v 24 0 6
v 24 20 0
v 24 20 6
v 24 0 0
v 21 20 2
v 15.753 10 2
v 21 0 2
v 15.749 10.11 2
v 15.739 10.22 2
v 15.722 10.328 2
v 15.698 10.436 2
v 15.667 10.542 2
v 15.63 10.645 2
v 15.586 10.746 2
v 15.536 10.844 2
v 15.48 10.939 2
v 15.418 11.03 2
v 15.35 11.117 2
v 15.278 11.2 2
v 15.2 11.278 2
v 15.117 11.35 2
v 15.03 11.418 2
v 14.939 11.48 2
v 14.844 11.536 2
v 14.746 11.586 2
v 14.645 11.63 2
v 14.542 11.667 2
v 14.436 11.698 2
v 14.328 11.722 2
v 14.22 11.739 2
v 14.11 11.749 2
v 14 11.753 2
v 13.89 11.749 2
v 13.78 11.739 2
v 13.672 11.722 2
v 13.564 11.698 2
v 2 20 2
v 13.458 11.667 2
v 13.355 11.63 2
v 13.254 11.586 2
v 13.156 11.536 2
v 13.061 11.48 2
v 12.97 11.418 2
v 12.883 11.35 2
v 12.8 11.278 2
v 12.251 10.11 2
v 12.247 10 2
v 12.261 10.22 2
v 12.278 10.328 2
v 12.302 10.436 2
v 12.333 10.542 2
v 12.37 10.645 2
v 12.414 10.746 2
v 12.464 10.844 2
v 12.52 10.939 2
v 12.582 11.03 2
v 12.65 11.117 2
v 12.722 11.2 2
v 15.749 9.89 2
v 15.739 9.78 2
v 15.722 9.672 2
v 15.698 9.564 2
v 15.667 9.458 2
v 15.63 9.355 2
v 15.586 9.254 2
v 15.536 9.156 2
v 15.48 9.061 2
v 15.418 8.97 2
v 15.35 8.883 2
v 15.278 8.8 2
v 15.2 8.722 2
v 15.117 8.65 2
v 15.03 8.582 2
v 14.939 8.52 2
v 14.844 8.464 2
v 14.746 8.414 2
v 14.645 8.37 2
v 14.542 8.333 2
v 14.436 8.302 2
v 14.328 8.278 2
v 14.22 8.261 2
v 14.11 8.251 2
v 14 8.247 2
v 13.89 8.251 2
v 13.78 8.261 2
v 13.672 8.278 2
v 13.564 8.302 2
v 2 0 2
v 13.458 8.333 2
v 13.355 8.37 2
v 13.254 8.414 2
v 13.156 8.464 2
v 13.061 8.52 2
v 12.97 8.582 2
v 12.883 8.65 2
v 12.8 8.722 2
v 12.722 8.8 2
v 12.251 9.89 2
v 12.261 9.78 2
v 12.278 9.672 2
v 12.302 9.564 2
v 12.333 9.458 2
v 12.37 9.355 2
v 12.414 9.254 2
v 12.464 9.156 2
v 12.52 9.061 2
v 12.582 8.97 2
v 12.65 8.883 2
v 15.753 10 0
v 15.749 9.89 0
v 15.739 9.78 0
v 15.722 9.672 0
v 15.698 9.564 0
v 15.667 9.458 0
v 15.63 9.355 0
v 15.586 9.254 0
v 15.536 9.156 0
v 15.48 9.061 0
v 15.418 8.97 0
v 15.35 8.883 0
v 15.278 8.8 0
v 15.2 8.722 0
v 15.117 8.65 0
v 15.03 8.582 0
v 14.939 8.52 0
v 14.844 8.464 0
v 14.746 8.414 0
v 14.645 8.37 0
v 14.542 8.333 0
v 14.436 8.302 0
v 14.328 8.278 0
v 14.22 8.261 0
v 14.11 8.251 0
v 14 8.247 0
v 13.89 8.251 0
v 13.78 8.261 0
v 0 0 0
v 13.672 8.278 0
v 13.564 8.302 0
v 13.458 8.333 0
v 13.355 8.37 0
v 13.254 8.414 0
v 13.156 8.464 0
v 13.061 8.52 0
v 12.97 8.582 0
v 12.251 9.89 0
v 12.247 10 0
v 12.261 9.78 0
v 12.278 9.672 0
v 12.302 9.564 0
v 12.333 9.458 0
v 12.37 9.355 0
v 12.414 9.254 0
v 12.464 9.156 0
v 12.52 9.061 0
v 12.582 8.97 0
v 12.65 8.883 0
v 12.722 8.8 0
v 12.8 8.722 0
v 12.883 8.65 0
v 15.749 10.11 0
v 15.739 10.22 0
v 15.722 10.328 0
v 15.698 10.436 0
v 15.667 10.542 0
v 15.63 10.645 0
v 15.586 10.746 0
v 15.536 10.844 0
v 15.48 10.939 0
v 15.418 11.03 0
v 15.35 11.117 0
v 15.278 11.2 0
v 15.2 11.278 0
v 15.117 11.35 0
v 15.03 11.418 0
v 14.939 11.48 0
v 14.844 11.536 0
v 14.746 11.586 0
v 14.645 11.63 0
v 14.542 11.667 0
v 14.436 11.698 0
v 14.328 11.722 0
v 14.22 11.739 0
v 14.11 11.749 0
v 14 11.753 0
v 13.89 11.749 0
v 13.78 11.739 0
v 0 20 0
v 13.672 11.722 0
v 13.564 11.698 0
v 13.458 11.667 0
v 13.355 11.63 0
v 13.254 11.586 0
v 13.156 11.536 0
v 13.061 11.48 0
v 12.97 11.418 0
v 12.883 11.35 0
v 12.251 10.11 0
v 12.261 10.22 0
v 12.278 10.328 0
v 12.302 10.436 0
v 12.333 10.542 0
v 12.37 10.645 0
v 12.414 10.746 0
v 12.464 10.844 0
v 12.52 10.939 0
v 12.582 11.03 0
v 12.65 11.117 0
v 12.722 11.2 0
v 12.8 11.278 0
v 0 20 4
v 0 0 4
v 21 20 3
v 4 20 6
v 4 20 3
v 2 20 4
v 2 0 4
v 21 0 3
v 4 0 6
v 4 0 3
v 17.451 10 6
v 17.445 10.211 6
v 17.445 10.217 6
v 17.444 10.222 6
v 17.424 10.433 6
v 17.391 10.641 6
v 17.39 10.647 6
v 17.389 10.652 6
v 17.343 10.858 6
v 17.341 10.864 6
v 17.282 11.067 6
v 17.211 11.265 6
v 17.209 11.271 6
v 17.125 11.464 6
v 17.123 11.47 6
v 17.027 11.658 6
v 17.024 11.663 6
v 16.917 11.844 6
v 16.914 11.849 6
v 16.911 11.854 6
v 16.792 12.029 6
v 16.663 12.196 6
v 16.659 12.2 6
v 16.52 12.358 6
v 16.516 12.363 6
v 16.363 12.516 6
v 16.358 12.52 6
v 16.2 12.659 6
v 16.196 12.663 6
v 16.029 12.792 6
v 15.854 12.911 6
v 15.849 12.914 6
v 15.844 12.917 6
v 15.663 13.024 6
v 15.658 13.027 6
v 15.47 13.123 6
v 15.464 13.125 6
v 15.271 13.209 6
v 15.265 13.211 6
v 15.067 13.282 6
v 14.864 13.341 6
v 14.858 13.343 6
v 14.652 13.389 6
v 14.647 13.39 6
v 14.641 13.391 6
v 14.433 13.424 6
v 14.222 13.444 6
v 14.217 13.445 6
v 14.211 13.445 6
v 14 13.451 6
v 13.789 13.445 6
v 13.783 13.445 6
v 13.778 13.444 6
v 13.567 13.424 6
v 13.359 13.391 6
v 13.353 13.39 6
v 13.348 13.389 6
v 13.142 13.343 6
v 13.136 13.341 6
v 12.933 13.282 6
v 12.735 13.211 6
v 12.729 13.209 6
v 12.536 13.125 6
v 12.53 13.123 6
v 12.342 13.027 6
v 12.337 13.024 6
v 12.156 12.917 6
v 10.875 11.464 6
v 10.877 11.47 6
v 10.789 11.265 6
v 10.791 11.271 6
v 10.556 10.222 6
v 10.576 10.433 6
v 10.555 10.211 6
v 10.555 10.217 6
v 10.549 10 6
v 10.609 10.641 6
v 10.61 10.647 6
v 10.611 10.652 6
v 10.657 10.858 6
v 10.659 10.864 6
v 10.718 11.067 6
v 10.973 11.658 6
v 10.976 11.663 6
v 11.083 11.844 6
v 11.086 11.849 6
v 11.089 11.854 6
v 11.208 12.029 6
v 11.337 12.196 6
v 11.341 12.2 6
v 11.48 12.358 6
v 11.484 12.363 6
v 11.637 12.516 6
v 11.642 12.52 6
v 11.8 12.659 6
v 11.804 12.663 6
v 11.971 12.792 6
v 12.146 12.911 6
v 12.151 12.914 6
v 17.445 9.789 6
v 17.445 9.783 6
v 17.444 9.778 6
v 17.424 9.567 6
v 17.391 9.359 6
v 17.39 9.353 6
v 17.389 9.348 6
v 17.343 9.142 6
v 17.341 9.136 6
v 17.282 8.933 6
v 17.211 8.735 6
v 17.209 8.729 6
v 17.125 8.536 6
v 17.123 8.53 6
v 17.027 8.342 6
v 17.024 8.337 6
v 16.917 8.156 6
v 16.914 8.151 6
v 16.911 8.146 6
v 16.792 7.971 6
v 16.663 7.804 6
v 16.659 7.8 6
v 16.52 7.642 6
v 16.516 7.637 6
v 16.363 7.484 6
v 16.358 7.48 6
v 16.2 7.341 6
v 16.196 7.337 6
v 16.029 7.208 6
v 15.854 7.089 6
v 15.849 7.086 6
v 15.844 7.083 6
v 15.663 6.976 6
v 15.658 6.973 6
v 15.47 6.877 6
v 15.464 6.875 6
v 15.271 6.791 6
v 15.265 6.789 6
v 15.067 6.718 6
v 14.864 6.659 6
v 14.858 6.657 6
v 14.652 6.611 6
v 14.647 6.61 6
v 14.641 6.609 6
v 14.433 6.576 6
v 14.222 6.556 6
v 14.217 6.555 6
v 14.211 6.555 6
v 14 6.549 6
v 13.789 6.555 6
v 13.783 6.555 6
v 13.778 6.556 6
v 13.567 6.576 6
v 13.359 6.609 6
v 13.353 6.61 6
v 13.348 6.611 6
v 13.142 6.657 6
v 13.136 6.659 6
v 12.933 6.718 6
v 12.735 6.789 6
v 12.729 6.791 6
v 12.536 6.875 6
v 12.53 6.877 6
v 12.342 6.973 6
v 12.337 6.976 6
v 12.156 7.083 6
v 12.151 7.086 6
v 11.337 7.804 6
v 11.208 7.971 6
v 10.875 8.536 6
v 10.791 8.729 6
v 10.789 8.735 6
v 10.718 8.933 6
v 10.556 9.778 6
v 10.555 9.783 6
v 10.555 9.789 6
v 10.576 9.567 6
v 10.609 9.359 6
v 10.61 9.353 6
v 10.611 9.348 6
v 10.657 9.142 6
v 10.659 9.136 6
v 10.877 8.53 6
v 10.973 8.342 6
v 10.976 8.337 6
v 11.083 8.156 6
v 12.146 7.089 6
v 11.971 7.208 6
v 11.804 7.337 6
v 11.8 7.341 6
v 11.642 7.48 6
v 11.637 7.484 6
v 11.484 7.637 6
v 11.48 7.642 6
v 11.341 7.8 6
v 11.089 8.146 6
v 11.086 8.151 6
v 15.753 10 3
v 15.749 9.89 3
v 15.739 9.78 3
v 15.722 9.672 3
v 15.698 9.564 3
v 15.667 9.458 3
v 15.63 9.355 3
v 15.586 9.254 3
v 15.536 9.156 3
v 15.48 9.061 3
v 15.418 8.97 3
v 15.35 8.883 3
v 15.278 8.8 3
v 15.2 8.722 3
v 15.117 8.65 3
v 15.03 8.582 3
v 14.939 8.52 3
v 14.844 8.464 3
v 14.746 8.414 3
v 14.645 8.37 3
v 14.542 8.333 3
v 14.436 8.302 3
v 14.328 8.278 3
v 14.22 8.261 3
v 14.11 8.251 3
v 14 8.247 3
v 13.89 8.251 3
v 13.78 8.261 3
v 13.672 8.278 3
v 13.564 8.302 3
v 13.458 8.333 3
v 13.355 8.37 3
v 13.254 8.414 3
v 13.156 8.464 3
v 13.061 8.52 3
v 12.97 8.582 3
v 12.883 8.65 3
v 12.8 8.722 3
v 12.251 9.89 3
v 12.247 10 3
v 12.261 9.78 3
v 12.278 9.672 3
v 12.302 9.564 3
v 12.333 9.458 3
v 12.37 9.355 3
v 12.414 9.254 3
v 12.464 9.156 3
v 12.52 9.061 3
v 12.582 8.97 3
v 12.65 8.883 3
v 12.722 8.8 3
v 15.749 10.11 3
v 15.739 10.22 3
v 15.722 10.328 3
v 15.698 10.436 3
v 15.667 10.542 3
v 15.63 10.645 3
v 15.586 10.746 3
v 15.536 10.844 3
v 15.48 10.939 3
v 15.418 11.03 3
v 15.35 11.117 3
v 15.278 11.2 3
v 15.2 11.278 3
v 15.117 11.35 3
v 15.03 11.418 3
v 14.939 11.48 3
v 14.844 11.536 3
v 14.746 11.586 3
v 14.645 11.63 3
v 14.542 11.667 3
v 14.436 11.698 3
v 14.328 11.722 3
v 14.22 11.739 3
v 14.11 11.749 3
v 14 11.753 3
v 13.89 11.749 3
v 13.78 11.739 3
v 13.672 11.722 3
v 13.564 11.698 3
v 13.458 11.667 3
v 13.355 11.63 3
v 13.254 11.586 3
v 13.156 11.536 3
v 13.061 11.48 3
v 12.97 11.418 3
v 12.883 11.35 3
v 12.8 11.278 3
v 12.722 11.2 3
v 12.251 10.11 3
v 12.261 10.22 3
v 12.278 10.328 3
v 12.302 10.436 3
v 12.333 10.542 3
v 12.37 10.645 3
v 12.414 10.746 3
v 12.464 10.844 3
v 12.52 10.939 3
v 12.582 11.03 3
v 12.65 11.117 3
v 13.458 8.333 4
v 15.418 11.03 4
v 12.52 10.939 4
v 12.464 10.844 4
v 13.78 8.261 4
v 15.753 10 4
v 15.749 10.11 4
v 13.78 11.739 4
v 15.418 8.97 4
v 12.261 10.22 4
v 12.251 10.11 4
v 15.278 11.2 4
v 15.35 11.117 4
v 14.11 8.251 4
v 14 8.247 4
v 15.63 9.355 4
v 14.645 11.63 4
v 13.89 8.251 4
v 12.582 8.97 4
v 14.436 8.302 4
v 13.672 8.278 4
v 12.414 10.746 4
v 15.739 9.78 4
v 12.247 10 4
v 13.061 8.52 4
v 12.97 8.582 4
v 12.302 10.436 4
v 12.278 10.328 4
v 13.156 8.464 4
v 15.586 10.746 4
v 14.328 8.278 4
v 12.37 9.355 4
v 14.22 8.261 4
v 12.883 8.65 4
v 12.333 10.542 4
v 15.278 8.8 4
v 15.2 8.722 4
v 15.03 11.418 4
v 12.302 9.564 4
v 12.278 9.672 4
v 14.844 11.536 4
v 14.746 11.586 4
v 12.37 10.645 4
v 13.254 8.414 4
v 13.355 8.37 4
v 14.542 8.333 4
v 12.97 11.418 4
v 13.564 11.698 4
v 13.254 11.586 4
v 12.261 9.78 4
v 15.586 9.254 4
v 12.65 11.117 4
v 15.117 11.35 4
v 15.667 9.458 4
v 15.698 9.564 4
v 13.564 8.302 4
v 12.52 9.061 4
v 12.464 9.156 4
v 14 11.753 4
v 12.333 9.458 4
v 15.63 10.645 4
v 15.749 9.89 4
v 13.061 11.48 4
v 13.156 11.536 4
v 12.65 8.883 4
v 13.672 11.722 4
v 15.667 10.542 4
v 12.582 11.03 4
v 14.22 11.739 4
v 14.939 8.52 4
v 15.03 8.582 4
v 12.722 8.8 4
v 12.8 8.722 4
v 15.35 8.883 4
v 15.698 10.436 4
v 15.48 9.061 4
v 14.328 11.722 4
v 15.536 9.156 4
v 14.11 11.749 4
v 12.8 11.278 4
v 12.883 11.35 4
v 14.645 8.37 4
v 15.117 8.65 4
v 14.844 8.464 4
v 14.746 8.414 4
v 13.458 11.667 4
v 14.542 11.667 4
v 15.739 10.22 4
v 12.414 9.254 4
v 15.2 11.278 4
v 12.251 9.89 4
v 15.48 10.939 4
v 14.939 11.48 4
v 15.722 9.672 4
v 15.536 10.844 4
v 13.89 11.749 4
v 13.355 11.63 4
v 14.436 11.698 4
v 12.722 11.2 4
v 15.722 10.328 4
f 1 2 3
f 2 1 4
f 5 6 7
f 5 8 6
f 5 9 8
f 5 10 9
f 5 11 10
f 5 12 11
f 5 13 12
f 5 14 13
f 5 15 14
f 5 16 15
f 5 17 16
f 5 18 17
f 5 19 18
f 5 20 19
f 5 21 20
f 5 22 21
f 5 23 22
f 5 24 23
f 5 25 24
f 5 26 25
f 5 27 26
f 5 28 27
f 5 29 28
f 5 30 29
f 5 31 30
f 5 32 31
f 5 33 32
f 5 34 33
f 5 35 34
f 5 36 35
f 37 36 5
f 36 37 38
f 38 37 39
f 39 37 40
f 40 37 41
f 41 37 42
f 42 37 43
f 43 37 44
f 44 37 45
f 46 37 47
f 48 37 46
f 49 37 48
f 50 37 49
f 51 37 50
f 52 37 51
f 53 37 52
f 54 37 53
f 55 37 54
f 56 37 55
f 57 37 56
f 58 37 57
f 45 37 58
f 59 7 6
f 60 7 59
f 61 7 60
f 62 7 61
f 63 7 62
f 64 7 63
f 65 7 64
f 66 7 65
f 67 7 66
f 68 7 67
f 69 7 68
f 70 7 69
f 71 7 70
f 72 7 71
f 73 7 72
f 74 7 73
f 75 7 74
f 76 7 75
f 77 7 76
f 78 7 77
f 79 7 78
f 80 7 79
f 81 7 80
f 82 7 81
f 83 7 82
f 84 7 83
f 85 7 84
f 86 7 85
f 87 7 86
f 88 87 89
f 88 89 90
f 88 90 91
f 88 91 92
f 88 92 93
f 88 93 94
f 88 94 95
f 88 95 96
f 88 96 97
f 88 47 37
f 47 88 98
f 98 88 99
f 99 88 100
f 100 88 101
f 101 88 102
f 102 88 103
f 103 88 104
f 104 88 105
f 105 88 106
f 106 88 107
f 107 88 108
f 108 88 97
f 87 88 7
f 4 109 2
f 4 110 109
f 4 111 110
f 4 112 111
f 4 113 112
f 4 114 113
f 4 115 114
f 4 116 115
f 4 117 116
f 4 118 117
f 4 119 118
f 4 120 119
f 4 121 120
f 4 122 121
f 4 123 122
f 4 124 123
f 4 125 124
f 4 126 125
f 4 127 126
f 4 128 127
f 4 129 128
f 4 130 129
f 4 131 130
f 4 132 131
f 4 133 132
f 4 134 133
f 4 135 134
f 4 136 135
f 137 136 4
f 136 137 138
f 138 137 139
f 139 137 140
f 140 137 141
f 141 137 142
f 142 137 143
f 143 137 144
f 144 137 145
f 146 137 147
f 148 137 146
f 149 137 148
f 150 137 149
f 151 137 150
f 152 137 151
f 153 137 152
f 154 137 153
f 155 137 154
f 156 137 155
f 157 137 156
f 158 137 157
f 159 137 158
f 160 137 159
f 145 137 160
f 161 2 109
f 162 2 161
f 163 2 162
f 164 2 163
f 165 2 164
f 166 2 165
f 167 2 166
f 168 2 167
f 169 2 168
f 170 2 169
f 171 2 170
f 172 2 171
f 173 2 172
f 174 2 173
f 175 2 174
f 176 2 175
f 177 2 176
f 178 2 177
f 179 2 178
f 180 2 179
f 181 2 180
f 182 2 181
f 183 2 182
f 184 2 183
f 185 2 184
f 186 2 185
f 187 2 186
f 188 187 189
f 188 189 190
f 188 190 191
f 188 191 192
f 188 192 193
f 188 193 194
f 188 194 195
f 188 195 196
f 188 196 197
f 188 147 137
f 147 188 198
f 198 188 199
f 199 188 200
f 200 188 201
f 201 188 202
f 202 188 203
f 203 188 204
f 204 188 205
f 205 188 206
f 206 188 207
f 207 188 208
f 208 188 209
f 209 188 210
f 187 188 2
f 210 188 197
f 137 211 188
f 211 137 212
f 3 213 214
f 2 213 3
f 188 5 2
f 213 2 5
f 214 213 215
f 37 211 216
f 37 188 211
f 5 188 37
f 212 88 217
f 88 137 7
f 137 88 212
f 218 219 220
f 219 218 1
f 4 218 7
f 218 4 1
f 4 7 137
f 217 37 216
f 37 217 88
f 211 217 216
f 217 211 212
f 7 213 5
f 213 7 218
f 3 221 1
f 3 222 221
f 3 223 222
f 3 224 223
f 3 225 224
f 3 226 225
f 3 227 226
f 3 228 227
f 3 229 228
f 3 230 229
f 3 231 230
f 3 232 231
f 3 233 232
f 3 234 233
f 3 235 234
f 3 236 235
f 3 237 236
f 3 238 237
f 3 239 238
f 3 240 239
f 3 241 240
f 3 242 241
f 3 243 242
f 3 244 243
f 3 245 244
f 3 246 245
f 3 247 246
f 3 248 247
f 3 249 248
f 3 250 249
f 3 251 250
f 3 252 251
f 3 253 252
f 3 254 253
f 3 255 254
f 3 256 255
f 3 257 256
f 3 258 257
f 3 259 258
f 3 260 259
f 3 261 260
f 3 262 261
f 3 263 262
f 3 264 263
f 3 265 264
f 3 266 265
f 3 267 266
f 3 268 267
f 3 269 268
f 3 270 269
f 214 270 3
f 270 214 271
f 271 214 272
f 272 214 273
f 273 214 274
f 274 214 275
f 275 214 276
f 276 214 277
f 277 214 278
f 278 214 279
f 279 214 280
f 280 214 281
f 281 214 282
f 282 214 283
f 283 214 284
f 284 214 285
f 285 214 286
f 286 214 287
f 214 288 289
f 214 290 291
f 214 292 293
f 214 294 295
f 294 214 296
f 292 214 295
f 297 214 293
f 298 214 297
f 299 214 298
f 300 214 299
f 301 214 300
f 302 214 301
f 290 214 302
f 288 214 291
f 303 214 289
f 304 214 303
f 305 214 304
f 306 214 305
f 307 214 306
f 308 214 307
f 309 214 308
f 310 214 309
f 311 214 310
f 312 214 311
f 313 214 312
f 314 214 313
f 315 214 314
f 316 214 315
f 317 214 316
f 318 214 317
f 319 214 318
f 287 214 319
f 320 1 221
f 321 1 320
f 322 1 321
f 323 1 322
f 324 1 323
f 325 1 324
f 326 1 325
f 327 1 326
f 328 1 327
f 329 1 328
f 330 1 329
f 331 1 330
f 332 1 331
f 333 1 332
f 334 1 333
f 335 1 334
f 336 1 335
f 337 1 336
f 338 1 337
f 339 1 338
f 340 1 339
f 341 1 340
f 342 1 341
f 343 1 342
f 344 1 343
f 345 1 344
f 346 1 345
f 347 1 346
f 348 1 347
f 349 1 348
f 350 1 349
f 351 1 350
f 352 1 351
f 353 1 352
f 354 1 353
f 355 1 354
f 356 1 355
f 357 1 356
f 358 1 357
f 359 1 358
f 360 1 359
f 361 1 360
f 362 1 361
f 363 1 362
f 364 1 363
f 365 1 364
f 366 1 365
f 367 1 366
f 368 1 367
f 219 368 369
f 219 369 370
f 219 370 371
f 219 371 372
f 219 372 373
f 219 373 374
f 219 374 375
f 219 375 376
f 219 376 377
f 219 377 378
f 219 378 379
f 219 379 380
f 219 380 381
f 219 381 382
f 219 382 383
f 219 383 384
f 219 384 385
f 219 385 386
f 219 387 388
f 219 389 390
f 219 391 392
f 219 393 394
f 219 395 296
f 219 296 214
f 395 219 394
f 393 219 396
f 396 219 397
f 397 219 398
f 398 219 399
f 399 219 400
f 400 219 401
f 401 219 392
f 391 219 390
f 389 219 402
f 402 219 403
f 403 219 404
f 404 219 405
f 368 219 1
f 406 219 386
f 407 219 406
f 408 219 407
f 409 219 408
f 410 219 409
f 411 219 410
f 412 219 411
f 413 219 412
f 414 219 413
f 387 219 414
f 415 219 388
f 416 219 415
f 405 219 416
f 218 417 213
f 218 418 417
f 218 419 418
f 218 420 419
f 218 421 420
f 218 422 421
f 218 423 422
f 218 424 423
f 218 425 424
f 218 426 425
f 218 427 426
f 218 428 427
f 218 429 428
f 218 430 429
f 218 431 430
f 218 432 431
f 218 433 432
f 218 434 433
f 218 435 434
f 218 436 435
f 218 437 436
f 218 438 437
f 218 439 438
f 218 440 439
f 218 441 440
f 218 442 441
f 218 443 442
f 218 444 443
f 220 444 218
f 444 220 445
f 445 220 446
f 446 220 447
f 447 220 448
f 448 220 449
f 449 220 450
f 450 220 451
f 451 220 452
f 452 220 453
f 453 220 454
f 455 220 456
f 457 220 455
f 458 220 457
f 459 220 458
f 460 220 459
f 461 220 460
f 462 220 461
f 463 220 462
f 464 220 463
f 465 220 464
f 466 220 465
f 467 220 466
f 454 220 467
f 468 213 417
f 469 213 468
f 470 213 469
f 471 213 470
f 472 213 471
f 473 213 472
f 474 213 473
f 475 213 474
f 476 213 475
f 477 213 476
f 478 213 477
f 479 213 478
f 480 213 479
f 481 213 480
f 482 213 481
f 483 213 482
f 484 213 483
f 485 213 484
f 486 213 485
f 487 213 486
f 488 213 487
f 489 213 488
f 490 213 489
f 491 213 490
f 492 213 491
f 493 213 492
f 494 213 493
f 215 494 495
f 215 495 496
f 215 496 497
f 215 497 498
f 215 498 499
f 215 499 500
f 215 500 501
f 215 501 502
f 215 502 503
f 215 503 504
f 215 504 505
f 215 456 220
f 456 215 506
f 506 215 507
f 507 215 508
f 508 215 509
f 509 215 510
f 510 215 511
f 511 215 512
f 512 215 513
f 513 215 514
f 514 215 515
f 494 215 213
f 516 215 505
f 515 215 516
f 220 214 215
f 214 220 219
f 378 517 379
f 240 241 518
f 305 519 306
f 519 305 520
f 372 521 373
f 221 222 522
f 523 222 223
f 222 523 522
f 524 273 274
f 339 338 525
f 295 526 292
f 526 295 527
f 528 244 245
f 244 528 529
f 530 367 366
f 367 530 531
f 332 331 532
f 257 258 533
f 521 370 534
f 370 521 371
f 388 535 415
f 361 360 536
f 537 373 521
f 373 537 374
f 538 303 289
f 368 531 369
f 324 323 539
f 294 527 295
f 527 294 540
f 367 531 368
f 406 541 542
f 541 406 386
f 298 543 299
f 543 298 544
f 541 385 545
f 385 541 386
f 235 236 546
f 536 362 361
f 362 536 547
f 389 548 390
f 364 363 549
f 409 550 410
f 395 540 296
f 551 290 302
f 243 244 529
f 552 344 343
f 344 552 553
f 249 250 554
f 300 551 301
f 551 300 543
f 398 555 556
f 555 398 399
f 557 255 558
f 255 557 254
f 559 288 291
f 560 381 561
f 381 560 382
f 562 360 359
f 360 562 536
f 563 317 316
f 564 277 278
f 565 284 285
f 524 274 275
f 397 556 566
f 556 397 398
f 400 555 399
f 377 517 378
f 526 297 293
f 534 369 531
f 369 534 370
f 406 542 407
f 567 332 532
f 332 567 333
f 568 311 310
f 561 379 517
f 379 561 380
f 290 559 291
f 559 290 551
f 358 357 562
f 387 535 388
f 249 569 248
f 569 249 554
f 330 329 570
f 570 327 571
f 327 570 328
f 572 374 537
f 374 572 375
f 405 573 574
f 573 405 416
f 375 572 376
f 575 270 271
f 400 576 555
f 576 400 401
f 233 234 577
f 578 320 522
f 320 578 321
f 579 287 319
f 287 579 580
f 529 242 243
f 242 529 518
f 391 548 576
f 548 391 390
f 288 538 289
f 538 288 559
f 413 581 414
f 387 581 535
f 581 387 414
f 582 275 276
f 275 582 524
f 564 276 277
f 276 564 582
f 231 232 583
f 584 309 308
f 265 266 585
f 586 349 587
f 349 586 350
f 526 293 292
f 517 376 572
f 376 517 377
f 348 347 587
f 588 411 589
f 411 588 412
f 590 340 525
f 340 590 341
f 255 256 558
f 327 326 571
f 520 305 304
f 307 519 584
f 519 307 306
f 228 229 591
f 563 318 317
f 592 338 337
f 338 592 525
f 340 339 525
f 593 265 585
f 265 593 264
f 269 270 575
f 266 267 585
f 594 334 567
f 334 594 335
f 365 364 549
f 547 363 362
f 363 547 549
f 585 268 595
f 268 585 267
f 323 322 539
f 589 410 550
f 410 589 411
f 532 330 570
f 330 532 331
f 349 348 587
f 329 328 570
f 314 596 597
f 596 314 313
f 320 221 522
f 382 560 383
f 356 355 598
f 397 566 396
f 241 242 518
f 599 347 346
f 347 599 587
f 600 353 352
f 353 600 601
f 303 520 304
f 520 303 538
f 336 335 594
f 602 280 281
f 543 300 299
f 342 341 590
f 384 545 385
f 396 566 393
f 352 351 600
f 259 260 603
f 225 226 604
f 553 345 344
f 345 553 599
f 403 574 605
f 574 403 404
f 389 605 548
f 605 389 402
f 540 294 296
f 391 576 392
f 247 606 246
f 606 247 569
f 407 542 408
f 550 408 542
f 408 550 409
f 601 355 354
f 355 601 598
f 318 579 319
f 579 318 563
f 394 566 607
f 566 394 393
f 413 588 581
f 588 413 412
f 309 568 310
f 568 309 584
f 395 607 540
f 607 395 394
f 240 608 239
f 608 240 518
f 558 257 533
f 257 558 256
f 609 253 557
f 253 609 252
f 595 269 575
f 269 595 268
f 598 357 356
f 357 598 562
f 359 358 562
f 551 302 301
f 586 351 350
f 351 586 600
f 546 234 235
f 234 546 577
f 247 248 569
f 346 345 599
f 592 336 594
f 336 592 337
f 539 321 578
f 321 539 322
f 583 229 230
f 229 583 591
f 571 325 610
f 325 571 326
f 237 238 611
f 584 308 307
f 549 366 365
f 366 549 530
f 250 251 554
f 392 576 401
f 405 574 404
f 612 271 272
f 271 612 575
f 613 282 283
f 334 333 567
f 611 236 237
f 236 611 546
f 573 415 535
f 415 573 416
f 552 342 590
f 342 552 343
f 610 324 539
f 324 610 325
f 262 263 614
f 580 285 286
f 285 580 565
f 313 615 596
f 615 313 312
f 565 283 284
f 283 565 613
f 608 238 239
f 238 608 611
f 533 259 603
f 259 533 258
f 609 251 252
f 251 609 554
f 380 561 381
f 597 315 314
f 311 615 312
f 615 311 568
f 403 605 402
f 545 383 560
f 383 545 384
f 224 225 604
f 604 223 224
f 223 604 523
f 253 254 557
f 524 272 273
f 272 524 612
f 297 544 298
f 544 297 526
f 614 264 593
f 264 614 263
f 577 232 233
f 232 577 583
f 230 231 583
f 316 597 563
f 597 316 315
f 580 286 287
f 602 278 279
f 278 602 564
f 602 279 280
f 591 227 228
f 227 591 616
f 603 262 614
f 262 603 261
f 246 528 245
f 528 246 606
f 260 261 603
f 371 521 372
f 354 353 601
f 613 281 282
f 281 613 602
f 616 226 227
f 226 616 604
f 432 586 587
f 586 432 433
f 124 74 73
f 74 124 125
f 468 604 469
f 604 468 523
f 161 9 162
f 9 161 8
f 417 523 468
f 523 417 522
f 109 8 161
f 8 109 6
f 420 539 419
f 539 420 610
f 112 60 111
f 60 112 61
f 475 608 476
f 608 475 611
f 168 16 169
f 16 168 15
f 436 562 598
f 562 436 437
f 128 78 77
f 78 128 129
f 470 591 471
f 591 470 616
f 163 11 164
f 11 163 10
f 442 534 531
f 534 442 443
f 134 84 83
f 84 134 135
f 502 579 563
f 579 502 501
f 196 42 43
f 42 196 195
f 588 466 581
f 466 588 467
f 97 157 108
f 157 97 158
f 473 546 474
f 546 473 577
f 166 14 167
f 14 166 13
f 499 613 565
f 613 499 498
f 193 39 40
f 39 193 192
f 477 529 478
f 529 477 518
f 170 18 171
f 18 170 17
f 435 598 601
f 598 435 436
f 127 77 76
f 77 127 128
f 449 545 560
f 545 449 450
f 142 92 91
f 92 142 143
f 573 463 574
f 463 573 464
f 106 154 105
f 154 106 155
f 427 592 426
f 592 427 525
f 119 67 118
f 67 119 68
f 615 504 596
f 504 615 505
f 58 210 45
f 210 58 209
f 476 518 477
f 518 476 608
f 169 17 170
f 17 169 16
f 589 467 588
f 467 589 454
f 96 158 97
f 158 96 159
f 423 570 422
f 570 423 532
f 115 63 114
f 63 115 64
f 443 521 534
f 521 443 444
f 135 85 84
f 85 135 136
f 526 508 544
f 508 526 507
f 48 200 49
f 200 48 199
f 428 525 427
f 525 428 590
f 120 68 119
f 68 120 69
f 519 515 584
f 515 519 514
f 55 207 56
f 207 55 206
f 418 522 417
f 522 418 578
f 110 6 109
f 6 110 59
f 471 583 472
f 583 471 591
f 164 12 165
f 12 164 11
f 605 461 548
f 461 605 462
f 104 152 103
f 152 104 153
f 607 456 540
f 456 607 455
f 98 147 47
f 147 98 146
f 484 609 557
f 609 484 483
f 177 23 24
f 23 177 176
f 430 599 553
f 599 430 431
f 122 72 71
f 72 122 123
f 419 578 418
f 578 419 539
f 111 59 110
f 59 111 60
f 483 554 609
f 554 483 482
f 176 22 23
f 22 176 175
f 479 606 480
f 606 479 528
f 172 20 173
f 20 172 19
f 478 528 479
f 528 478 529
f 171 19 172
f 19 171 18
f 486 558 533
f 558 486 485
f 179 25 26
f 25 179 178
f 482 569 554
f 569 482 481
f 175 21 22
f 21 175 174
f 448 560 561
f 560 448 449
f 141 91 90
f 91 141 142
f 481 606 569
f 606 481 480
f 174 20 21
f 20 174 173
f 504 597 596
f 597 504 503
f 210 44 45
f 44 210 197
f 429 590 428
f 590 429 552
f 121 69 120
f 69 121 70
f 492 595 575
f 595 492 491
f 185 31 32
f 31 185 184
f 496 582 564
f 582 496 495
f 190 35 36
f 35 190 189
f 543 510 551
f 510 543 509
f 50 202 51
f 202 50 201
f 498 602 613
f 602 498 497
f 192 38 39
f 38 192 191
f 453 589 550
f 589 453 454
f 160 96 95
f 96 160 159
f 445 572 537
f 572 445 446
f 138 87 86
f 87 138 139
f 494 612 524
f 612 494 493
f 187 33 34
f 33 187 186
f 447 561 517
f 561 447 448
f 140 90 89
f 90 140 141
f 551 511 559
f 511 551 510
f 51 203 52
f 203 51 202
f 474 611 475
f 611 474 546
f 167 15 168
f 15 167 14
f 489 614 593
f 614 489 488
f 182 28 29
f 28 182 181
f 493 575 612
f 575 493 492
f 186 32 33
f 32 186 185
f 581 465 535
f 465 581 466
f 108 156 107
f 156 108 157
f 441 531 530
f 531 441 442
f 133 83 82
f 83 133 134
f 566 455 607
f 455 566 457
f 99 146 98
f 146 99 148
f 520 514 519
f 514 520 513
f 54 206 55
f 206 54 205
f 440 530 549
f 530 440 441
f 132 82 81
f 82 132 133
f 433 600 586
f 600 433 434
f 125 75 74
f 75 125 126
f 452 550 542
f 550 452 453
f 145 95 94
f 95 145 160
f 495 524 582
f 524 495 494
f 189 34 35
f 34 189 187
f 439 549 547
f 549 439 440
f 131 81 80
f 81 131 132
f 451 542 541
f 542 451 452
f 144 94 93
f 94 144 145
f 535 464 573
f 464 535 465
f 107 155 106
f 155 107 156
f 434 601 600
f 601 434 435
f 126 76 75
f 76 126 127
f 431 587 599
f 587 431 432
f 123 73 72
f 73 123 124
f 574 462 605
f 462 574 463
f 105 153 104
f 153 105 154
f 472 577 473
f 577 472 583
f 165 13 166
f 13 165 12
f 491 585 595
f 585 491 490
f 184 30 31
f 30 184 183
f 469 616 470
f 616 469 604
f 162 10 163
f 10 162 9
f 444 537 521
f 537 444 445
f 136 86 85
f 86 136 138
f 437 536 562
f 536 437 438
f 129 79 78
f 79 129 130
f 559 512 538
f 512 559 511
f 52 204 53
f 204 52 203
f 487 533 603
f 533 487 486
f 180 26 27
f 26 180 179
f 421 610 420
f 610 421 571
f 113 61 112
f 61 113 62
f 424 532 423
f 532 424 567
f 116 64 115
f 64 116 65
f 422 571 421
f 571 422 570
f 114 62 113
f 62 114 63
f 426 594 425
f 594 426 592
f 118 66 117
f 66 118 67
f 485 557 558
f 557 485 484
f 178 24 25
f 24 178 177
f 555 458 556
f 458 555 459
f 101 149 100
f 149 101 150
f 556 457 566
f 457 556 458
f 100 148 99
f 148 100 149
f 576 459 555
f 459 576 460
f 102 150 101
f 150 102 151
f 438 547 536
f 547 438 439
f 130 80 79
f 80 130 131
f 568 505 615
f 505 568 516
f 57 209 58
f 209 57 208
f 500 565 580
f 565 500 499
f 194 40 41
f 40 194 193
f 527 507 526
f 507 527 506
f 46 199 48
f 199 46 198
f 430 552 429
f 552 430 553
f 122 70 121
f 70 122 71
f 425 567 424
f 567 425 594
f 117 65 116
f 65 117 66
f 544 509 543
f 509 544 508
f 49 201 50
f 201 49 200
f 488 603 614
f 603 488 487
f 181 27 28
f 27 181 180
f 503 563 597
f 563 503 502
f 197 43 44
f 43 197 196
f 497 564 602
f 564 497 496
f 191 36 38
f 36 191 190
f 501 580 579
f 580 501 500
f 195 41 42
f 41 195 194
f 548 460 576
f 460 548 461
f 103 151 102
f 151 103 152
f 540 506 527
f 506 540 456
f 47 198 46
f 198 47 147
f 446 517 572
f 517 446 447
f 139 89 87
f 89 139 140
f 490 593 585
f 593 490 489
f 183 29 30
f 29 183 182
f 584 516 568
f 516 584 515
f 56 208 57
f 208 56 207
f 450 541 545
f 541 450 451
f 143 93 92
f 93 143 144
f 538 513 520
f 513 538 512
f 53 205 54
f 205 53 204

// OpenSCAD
width = 20;
depth = 24;
headMaxRadius = (0.279 * 25.4) / 2;
headMinRadius = (0.138 * 25.4) / 2;
headHeight = (0.083 * 25.4);
headOffset = 2;

$fn=100;

difference() {
    union() {
        cube([depth, width, 2]);
        translate([0, 0, 2]) cube([2, width, 2]);
        translate([depth-3, 0, 2]) cube([3, width, 2]);
        translate([4, 0, 3]) cube([20, width, 3]);
    }
    union() {
        translate([(depth/2)+headOffset,width/2,4]) cylinder(headHeight, headMinRadius, headMaxRadius);
        translate([(depth/2)+headOffset,width/2,-1]) cylinder(6, headMinRadius, headMinRadius);
    }
}
